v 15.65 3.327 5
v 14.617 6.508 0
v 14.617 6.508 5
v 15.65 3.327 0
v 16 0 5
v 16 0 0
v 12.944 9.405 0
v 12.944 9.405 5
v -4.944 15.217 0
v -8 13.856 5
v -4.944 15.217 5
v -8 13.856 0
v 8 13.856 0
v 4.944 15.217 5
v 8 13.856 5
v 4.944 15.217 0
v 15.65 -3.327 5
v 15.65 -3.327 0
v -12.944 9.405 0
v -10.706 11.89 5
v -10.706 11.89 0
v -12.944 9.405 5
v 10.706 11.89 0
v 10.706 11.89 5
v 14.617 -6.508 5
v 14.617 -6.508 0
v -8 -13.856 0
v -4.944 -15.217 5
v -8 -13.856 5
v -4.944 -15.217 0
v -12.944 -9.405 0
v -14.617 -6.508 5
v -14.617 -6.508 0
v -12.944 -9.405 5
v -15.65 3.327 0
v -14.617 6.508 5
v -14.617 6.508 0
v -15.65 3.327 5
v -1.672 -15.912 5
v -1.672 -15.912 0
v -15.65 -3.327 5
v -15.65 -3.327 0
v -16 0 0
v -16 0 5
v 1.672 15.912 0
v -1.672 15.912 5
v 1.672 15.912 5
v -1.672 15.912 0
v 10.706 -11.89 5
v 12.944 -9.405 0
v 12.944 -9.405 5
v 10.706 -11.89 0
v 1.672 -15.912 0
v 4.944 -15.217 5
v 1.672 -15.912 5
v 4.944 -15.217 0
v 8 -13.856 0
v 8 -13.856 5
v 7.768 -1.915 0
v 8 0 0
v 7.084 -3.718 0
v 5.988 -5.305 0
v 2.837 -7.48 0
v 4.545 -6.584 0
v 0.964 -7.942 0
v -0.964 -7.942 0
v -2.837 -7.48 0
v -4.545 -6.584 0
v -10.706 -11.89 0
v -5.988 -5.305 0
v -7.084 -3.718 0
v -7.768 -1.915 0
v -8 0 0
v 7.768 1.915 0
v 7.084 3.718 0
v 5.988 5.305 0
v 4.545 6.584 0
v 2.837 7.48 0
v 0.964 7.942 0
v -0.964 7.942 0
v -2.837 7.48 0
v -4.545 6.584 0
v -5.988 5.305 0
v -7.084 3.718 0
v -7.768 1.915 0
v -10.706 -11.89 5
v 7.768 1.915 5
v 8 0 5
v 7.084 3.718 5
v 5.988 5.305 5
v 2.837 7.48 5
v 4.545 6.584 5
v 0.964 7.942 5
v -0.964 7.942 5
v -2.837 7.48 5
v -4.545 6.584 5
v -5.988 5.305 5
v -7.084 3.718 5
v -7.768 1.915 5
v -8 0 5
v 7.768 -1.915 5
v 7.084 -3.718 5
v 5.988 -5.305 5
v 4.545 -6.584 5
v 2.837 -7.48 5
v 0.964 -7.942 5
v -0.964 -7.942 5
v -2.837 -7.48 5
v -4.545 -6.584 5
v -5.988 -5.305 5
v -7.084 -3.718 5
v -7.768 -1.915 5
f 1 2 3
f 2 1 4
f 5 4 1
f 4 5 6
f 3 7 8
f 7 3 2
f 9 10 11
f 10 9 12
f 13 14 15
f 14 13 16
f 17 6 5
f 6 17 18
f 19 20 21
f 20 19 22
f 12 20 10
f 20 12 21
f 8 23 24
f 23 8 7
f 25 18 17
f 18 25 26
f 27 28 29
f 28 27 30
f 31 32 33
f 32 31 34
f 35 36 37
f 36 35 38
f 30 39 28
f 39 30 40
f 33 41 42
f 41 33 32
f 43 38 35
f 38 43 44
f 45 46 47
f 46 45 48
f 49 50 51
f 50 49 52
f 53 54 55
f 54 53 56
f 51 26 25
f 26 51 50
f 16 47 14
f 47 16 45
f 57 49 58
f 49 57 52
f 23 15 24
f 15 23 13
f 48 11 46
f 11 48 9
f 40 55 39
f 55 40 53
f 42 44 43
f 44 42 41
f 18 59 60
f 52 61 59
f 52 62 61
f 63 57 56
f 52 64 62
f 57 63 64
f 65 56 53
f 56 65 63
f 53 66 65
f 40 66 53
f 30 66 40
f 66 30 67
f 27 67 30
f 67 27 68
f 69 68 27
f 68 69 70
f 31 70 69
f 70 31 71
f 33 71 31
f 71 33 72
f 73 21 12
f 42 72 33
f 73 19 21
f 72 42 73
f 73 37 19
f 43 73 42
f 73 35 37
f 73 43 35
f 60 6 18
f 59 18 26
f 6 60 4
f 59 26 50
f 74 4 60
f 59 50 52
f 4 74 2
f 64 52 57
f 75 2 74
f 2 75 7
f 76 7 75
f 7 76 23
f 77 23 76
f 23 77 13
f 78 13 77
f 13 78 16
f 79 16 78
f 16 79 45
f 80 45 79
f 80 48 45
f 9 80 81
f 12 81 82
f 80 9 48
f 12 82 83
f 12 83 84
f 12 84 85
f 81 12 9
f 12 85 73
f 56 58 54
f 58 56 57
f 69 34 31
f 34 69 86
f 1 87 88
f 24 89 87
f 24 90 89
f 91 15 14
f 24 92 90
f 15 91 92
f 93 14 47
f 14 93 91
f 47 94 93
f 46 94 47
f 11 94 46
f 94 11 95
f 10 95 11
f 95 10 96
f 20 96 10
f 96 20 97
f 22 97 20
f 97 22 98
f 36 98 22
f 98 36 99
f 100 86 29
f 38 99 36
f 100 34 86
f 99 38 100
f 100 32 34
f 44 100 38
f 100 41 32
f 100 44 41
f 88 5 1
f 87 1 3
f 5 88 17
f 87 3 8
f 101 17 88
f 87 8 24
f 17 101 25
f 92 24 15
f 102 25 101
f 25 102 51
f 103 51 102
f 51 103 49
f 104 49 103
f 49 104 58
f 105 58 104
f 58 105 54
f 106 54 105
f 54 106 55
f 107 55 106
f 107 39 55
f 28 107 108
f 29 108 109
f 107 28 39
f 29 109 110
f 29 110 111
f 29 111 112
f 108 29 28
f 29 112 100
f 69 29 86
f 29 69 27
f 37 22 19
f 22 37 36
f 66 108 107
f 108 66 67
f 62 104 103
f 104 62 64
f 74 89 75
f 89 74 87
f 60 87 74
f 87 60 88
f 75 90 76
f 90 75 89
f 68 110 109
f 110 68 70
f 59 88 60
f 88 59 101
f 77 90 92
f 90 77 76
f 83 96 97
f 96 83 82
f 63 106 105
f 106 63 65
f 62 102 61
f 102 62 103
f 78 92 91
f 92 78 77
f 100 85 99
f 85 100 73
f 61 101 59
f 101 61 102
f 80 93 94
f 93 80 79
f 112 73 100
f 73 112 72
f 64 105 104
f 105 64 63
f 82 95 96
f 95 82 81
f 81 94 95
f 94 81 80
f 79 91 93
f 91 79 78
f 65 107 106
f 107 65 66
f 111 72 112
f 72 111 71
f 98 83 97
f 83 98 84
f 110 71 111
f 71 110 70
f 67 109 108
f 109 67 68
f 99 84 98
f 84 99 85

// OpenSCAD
// This is a test for a push fit onto the
// enlarger guide post
difference(){
    cylinder(5,16,16, centre=true);
    translate([0,0,-4]){
            cylinder(10,8,8, centre=true);
    }
}
